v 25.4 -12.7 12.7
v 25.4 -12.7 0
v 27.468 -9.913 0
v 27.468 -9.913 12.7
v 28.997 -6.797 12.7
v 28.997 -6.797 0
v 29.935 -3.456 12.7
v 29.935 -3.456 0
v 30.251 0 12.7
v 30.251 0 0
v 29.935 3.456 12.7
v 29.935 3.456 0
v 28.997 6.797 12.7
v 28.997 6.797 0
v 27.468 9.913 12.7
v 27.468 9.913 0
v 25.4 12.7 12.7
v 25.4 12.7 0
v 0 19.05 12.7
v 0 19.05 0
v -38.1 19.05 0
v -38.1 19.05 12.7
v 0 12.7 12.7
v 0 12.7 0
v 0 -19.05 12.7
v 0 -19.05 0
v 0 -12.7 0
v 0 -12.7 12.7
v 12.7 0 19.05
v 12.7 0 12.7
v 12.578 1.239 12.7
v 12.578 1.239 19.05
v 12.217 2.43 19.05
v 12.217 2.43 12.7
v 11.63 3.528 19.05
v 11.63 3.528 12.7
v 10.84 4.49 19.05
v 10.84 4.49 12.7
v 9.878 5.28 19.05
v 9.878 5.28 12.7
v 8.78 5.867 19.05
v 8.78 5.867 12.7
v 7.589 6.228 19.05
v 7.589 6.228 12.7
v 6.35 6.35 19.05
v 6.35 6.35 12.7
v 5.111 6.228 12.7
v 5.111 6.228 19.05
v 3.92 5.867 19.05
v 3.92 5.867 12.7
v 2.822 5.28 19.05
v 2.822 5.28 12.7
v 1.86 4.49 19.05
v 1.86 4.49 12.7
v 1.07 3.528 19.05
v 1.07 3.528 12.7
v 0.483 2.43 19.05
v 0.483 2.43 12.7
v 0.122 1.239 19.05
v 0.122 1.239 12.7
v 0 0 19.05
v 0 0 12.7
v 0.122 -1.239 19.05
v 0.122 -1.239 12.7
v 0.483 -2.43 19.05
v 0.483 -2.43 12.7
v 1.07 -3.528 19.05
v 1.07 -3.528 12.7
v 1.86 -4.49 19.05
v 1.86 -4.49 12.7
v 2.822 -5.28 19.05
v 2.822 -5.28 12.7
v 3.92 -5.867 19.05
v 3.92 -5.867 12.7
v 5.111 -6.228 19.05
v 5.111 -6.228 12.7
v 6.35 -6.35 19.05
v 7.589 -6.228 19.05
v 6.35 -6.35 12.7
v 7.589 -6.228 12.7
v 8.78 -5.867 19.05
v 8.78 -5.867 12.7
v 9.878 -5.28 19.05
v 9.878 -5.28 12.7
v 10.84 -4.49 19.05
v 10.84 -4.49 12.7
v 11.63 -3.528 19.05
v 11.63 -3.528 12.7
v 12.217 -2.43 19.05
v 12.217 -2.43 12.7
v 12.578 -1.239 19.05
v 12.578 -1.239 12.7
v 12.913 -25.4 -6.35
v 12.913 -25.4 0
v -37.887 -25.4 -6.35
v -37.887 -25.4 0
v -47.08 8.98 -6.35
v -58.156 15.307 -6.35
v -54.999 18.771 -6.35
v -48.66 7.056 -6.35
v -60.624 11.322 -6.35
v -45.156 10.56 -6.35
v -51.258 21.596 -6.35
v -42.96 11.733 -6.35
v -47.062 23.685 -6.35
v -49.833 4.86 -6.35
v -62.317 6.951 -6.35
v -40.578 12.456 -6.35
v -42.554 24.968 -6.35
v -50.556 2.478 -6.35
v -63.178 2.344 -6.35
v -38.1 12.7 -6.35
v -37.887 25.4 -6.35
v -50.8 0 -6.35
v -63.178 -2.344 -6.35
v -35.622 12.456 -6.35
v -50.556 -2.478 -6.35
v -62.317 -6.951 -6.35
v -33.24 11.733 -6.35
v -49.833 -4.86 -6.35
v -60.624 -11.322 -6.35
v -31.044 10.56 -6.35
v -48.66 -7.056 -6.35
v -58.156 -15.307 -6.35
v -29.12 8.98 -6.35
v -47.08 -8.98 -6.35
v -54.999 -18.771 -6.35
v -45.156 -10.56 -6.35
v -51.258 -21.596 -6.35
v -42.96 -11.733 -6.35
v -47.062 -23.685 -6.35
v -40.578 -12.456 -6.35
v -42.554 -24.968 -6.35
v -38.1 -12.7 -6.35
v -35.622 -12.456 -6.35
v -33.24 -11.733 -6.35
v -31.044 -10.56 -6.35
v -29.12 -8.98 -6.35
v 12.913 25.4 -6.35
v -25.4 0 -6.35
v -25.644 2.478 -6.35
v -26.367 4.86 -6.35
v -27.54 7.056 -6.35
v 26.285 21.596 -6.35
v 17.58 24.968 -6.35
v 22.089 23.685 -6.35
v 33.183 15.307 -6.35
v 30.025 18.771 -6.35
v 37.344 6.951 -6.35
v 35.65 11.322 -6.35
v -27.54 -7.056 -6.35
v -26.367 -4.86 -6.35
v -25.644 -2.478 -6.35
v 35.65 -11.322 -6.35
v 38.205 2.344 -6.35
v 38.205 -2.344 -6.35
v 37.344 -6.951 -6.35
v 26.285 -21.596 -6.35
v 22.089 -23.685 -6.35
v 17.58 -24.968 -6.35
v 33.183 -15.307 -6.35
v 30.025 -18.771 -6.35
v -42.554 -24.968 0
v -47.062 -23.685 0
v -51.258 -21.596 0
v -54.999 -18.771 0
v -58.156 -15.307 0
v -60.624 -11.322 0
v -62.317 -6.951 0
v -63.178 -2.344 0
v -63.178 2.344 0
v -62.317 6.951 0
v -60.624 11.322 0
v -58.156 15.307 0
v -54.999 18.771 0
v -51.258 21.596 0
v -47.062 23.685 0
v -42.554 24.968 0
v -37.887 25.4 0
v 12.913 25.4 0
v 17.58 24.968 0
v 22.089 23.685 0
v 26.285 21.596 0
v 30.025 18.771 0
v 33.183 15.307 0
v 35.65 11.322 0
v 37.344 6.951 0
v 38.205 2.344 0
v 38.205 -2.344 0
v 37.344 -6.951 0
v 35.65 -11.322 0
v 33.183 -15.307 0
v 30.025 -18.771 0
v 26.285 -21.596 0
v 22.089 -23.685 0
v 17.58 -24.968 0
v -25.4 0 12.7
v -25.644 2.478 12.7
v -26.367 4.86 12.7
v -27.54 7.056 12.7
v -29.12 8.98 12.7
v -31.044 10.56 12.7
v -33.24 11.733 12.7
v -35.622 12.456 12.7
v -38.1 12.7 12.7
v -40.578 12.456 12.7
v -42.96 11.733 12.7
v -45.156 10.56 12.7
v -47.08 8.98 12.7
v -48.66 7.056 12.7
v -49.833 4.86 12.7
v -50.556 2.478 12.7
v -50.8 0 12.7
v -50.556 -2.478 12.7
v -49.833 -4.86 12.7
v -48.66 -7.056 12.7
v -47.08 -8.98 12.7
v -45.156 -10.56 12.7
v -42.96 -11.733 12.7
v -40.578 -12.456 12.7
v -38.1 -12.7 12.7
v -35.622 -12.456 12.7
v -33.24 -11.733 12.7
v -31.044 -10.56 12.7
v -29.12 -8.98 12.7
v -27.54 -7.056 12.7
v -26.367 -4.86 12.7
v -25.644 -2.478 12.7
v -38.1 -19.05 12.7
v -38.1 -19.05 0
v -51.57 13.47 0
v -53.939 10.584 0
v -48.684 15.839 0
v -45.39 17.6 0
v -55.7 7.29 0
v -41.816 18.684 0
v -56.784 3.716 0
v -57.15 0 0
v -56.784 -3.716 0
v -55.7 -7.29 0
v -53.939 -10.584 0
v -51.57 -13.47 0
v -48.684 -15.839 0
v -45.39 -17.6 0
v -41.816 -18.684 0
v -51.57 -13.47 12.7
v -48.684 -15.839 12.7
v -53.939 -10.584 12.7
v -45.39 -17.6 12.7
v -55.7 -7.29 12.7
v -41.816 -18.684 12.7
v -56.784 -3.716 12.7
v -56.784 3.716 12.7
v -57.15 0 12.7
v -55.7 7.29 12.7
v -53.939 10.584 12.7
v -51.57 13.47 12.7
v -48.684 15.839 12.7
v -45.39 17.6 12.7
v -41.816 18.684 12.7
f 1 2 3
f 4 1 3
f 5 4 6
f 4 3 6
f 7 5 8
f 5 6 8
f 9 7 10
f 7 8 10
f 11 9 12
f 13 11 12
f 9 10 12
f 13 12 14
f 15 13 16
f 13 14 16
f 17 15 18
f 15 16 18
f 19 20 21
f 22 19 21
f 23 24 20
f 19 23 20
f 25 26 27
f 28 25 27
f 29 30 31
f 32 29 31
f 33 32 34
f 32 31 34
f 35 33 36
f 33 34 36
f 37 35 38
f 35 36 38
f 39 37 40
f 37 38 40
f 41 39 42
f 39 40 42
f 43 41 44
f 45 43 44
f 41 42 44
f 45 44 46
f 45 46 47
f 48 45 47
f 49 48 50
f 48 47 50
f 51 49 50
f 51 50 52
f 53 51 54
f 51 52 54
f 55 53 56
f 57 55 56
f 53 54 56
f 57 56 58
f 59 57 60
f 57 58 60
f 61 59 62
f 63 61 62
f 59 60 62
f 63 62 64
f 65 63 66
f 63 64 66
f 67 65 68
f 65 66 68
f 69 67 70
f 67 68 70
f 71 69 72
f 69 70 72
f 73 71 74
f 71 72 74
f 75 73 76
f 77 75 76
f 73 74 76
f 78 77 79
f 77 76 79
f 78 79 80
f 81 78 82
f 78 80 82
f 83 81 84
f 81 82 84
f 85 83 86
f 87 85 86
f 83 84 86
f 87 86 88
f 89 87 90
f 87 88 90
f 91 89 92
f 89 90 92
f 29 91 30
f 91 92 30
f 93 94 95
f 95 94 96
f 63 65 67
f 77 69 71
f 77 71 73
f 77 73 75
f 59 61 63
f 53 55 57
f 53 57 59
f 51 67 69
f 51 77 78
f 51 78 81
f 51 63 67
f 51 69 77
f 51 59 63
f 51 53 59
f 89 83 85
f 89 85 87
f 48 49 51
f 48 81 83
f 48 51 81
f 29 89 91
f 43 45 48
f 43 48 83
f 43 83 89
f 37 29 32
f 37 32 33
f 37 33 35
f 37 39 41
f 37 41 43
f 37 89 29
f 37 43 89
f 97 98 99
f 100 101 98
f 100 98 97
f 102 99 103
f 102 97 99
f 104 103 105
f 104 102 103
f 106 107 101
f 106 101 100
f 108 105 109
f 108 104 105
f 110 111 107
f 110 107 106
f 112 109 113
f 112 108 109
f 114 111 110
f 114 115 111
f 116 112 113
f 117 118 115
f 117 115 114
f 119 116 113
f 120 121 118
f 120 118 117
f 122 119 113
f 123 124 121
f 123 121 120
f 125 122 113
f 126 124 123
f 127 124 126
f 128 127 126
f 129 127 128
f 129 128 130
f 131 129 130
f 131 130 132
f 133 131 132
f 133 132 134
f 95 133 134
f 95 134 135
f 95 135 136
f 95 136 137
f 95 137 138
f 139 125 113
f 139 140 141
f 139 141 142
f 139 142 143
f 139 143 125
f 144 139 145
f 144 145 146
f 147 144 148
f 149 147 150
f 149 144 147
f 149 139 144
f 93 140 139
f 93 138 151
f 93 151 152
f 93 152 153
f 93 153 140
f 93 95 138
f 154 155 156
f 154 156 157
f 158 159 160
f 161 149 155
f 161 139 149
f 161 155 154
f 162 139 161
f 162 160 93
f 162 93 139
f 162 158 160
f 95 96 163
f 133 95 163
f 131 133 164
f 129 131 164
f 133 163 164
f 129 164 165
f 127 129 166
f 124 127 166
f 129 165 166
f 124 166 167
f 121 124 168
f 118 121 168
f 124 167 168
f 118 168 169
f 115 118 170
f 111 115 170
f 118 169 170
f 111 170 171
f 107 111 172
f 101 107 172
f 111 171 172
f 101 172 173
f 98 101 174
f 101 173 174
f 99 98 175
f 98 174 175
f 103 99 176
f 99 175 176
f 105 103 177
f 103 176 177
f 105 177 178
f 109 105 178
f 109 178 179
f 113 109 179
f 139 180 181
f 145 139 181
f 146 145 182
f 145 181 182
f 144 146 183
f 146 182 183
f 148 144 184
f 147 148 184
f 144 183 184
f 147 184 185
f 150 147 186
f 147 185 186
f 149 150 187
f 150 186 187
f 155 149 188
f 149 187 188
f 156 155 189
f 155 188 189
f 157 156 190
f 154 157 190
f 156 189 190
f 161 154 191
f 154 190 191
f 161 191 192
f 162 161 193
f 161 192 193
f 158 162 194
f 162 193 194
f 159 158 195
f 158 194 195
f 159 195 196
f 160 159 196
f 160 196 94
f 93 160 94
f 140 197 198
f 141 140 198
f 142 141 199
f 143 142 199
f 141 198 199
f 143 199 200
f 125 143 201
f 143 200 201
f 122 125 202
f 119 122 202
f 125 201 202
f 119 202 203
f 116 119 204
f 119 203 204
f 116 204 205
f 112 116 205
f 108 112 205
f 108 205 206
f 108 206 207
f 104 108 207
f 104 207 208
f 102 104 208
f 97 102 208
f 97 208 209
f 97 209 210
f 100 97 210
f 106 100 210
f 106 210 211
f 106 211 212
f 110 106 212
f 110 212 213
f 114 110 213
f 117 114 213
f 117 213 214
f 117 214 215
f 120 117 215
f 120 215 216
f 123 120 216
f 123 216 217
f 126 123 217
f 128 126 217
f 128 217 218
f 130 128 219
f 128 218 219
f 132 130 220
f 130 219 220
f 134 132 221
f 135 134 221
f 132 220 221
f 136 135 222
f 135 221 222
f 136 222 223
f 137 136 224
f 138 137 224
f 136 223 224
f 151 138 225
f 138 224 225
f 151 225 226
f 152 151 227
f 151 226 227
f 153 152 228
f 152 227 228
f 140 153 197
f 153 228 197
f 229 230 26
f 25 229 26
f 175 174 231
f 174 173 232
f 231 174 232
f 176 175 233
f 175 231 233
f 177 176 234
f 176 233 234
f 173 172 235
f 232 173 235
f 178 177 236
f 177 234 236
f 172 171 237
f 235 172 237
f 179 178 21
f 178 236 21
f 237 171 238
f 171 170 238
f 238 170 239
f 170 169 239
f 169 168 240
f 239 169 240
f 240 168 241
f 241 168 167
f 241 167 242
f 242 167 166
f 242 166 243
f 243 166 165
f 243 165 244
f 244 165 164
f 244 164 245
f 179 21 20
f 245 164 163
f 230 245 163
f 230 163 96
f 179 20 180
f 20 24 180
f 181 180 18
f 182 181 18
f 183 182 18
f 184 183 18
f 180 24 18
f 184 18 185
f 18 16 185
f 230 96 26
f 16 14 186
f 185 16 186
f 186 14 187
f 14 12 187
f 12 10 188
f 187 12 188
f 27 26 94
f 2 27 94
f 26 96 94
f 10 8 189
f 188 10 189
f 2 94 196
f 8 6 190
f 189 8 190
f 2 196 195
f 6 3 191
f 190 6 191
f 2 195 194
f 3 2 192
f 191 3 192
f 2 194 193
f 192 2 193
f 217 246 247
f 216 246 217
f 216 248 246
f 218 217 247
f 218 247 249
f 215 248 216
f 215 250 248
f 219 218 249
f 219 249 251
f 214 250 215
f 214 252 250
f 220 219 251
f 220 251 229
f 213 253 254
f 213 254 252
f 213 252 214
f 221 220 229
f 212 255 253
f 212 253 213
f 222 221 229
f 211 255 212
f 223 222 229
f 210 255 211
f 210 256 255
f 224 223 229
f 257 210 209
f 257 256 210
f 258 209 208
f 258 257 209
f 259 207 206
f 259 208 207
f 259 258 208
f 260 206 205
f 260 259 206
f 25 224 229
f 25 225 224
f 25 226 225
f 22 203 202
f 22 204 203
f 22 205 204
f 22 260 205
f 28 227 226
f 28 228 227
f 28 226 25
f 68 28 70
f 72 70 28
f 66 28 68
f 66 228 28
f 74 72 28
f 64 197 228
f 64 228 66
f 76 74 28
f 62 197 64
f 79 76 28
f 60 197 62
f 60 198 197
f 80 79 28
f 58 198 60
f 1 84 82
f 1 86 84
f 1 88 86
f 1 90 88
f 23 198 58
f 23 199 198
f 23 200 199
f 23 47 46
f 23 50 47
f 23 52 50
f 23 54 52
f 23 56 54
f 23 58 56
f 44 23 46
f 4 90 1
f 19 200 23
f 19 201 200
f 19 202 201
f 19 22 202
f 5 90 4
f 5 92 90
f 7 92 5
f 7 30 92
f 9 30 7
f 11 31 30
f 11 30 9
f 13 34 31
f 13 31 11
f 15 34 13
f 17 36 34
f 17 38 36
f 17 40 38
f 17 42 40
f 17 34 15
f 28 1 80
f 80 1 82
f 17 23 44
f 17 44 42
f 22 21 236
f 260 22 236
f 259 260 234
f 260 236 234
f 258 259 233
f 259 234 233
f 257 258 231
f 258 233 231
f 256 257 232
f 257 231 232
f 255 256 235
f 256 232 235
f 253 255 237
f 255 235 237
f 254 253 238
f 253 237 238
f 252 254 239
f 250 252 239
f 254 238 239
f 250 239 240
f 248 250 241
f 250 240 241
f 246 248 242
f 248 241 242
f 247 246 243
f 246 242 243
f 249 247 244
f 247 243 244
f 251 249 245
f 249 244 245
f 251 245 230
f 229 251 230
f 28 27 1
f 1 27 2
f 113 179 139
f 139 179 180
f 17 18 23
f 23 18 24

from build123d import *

# Parameters (mm, degrees)
F1_DEPTH = 12.7
F4_DEPTH = 6.35
F2_R     = 12.7
F5_DEPTH = 19.051
F2_R_2   = 6.35
F6_DEPTH = 6.35


with BuildPart() as f1:
    # F0 (on Top) → F1 (new body)
    with BuildSketch(Plane.XY):
        with BuildLine():
            Line((-38.1, -19.05), (0, -19.05))
            Line((0, -19.05), (0, -12.7))
            Line((0, -12.7), (25.4, -12.7))
            ThreePointArc((25.4, -12.7), (30.250968, 0), (25.4, 12.7))
            Line((25.4, 12.7), (0, 12.7))
            Line((0, 12.7), (0, 19.05))
            Line((0, 19.05), (-38.1, 19.05))
            ThreePointArc((-38.1, 19.05), (-57.15, 0), (-38.1, -19.05))
        make_face()
    extrude(amount=F1_DEPTH)

    # F3 (on face) → F4 (join)
    with BuildSketch(Plane(origin=(0, 0, 0), x_dir=(1, 0, 0), z_dir=(0, 0, -1))):
        with BuildLine():
            Line((12.91321, 25.4), (-37.88679, 25.4))
            ThreePointArc((-37.88679, 25.4), (-63.28679, 0), (-37.88679, -25.4))
            Line((-37.88679, -25.4), (12.91321, -25.4))
            ThreePointArc((12.91321, -25.4), (38.31321, 0), (12.91321, 25.4))
        make_face()
    extrude(amount=F4_DEPTH)

    # F2 (on face) → F5 (cut, through all)
    with BuildSketch(Plane.XY.offset(12.7)):
        with Locations((-38.1, 0)):
            Circle(F2_R)
    extrude(amount=-F5_DEPTH, mode=Mode.SUBTRACT)

    # F2 (on face) → F6 (join)
    with BuildSketch(Plane.XY.offset(12.7)):
        with Locations((6.35, 0)):
            Circle(F2_R_2)
    extrude(amount=F6_DEPTH)


solid = f1.part
